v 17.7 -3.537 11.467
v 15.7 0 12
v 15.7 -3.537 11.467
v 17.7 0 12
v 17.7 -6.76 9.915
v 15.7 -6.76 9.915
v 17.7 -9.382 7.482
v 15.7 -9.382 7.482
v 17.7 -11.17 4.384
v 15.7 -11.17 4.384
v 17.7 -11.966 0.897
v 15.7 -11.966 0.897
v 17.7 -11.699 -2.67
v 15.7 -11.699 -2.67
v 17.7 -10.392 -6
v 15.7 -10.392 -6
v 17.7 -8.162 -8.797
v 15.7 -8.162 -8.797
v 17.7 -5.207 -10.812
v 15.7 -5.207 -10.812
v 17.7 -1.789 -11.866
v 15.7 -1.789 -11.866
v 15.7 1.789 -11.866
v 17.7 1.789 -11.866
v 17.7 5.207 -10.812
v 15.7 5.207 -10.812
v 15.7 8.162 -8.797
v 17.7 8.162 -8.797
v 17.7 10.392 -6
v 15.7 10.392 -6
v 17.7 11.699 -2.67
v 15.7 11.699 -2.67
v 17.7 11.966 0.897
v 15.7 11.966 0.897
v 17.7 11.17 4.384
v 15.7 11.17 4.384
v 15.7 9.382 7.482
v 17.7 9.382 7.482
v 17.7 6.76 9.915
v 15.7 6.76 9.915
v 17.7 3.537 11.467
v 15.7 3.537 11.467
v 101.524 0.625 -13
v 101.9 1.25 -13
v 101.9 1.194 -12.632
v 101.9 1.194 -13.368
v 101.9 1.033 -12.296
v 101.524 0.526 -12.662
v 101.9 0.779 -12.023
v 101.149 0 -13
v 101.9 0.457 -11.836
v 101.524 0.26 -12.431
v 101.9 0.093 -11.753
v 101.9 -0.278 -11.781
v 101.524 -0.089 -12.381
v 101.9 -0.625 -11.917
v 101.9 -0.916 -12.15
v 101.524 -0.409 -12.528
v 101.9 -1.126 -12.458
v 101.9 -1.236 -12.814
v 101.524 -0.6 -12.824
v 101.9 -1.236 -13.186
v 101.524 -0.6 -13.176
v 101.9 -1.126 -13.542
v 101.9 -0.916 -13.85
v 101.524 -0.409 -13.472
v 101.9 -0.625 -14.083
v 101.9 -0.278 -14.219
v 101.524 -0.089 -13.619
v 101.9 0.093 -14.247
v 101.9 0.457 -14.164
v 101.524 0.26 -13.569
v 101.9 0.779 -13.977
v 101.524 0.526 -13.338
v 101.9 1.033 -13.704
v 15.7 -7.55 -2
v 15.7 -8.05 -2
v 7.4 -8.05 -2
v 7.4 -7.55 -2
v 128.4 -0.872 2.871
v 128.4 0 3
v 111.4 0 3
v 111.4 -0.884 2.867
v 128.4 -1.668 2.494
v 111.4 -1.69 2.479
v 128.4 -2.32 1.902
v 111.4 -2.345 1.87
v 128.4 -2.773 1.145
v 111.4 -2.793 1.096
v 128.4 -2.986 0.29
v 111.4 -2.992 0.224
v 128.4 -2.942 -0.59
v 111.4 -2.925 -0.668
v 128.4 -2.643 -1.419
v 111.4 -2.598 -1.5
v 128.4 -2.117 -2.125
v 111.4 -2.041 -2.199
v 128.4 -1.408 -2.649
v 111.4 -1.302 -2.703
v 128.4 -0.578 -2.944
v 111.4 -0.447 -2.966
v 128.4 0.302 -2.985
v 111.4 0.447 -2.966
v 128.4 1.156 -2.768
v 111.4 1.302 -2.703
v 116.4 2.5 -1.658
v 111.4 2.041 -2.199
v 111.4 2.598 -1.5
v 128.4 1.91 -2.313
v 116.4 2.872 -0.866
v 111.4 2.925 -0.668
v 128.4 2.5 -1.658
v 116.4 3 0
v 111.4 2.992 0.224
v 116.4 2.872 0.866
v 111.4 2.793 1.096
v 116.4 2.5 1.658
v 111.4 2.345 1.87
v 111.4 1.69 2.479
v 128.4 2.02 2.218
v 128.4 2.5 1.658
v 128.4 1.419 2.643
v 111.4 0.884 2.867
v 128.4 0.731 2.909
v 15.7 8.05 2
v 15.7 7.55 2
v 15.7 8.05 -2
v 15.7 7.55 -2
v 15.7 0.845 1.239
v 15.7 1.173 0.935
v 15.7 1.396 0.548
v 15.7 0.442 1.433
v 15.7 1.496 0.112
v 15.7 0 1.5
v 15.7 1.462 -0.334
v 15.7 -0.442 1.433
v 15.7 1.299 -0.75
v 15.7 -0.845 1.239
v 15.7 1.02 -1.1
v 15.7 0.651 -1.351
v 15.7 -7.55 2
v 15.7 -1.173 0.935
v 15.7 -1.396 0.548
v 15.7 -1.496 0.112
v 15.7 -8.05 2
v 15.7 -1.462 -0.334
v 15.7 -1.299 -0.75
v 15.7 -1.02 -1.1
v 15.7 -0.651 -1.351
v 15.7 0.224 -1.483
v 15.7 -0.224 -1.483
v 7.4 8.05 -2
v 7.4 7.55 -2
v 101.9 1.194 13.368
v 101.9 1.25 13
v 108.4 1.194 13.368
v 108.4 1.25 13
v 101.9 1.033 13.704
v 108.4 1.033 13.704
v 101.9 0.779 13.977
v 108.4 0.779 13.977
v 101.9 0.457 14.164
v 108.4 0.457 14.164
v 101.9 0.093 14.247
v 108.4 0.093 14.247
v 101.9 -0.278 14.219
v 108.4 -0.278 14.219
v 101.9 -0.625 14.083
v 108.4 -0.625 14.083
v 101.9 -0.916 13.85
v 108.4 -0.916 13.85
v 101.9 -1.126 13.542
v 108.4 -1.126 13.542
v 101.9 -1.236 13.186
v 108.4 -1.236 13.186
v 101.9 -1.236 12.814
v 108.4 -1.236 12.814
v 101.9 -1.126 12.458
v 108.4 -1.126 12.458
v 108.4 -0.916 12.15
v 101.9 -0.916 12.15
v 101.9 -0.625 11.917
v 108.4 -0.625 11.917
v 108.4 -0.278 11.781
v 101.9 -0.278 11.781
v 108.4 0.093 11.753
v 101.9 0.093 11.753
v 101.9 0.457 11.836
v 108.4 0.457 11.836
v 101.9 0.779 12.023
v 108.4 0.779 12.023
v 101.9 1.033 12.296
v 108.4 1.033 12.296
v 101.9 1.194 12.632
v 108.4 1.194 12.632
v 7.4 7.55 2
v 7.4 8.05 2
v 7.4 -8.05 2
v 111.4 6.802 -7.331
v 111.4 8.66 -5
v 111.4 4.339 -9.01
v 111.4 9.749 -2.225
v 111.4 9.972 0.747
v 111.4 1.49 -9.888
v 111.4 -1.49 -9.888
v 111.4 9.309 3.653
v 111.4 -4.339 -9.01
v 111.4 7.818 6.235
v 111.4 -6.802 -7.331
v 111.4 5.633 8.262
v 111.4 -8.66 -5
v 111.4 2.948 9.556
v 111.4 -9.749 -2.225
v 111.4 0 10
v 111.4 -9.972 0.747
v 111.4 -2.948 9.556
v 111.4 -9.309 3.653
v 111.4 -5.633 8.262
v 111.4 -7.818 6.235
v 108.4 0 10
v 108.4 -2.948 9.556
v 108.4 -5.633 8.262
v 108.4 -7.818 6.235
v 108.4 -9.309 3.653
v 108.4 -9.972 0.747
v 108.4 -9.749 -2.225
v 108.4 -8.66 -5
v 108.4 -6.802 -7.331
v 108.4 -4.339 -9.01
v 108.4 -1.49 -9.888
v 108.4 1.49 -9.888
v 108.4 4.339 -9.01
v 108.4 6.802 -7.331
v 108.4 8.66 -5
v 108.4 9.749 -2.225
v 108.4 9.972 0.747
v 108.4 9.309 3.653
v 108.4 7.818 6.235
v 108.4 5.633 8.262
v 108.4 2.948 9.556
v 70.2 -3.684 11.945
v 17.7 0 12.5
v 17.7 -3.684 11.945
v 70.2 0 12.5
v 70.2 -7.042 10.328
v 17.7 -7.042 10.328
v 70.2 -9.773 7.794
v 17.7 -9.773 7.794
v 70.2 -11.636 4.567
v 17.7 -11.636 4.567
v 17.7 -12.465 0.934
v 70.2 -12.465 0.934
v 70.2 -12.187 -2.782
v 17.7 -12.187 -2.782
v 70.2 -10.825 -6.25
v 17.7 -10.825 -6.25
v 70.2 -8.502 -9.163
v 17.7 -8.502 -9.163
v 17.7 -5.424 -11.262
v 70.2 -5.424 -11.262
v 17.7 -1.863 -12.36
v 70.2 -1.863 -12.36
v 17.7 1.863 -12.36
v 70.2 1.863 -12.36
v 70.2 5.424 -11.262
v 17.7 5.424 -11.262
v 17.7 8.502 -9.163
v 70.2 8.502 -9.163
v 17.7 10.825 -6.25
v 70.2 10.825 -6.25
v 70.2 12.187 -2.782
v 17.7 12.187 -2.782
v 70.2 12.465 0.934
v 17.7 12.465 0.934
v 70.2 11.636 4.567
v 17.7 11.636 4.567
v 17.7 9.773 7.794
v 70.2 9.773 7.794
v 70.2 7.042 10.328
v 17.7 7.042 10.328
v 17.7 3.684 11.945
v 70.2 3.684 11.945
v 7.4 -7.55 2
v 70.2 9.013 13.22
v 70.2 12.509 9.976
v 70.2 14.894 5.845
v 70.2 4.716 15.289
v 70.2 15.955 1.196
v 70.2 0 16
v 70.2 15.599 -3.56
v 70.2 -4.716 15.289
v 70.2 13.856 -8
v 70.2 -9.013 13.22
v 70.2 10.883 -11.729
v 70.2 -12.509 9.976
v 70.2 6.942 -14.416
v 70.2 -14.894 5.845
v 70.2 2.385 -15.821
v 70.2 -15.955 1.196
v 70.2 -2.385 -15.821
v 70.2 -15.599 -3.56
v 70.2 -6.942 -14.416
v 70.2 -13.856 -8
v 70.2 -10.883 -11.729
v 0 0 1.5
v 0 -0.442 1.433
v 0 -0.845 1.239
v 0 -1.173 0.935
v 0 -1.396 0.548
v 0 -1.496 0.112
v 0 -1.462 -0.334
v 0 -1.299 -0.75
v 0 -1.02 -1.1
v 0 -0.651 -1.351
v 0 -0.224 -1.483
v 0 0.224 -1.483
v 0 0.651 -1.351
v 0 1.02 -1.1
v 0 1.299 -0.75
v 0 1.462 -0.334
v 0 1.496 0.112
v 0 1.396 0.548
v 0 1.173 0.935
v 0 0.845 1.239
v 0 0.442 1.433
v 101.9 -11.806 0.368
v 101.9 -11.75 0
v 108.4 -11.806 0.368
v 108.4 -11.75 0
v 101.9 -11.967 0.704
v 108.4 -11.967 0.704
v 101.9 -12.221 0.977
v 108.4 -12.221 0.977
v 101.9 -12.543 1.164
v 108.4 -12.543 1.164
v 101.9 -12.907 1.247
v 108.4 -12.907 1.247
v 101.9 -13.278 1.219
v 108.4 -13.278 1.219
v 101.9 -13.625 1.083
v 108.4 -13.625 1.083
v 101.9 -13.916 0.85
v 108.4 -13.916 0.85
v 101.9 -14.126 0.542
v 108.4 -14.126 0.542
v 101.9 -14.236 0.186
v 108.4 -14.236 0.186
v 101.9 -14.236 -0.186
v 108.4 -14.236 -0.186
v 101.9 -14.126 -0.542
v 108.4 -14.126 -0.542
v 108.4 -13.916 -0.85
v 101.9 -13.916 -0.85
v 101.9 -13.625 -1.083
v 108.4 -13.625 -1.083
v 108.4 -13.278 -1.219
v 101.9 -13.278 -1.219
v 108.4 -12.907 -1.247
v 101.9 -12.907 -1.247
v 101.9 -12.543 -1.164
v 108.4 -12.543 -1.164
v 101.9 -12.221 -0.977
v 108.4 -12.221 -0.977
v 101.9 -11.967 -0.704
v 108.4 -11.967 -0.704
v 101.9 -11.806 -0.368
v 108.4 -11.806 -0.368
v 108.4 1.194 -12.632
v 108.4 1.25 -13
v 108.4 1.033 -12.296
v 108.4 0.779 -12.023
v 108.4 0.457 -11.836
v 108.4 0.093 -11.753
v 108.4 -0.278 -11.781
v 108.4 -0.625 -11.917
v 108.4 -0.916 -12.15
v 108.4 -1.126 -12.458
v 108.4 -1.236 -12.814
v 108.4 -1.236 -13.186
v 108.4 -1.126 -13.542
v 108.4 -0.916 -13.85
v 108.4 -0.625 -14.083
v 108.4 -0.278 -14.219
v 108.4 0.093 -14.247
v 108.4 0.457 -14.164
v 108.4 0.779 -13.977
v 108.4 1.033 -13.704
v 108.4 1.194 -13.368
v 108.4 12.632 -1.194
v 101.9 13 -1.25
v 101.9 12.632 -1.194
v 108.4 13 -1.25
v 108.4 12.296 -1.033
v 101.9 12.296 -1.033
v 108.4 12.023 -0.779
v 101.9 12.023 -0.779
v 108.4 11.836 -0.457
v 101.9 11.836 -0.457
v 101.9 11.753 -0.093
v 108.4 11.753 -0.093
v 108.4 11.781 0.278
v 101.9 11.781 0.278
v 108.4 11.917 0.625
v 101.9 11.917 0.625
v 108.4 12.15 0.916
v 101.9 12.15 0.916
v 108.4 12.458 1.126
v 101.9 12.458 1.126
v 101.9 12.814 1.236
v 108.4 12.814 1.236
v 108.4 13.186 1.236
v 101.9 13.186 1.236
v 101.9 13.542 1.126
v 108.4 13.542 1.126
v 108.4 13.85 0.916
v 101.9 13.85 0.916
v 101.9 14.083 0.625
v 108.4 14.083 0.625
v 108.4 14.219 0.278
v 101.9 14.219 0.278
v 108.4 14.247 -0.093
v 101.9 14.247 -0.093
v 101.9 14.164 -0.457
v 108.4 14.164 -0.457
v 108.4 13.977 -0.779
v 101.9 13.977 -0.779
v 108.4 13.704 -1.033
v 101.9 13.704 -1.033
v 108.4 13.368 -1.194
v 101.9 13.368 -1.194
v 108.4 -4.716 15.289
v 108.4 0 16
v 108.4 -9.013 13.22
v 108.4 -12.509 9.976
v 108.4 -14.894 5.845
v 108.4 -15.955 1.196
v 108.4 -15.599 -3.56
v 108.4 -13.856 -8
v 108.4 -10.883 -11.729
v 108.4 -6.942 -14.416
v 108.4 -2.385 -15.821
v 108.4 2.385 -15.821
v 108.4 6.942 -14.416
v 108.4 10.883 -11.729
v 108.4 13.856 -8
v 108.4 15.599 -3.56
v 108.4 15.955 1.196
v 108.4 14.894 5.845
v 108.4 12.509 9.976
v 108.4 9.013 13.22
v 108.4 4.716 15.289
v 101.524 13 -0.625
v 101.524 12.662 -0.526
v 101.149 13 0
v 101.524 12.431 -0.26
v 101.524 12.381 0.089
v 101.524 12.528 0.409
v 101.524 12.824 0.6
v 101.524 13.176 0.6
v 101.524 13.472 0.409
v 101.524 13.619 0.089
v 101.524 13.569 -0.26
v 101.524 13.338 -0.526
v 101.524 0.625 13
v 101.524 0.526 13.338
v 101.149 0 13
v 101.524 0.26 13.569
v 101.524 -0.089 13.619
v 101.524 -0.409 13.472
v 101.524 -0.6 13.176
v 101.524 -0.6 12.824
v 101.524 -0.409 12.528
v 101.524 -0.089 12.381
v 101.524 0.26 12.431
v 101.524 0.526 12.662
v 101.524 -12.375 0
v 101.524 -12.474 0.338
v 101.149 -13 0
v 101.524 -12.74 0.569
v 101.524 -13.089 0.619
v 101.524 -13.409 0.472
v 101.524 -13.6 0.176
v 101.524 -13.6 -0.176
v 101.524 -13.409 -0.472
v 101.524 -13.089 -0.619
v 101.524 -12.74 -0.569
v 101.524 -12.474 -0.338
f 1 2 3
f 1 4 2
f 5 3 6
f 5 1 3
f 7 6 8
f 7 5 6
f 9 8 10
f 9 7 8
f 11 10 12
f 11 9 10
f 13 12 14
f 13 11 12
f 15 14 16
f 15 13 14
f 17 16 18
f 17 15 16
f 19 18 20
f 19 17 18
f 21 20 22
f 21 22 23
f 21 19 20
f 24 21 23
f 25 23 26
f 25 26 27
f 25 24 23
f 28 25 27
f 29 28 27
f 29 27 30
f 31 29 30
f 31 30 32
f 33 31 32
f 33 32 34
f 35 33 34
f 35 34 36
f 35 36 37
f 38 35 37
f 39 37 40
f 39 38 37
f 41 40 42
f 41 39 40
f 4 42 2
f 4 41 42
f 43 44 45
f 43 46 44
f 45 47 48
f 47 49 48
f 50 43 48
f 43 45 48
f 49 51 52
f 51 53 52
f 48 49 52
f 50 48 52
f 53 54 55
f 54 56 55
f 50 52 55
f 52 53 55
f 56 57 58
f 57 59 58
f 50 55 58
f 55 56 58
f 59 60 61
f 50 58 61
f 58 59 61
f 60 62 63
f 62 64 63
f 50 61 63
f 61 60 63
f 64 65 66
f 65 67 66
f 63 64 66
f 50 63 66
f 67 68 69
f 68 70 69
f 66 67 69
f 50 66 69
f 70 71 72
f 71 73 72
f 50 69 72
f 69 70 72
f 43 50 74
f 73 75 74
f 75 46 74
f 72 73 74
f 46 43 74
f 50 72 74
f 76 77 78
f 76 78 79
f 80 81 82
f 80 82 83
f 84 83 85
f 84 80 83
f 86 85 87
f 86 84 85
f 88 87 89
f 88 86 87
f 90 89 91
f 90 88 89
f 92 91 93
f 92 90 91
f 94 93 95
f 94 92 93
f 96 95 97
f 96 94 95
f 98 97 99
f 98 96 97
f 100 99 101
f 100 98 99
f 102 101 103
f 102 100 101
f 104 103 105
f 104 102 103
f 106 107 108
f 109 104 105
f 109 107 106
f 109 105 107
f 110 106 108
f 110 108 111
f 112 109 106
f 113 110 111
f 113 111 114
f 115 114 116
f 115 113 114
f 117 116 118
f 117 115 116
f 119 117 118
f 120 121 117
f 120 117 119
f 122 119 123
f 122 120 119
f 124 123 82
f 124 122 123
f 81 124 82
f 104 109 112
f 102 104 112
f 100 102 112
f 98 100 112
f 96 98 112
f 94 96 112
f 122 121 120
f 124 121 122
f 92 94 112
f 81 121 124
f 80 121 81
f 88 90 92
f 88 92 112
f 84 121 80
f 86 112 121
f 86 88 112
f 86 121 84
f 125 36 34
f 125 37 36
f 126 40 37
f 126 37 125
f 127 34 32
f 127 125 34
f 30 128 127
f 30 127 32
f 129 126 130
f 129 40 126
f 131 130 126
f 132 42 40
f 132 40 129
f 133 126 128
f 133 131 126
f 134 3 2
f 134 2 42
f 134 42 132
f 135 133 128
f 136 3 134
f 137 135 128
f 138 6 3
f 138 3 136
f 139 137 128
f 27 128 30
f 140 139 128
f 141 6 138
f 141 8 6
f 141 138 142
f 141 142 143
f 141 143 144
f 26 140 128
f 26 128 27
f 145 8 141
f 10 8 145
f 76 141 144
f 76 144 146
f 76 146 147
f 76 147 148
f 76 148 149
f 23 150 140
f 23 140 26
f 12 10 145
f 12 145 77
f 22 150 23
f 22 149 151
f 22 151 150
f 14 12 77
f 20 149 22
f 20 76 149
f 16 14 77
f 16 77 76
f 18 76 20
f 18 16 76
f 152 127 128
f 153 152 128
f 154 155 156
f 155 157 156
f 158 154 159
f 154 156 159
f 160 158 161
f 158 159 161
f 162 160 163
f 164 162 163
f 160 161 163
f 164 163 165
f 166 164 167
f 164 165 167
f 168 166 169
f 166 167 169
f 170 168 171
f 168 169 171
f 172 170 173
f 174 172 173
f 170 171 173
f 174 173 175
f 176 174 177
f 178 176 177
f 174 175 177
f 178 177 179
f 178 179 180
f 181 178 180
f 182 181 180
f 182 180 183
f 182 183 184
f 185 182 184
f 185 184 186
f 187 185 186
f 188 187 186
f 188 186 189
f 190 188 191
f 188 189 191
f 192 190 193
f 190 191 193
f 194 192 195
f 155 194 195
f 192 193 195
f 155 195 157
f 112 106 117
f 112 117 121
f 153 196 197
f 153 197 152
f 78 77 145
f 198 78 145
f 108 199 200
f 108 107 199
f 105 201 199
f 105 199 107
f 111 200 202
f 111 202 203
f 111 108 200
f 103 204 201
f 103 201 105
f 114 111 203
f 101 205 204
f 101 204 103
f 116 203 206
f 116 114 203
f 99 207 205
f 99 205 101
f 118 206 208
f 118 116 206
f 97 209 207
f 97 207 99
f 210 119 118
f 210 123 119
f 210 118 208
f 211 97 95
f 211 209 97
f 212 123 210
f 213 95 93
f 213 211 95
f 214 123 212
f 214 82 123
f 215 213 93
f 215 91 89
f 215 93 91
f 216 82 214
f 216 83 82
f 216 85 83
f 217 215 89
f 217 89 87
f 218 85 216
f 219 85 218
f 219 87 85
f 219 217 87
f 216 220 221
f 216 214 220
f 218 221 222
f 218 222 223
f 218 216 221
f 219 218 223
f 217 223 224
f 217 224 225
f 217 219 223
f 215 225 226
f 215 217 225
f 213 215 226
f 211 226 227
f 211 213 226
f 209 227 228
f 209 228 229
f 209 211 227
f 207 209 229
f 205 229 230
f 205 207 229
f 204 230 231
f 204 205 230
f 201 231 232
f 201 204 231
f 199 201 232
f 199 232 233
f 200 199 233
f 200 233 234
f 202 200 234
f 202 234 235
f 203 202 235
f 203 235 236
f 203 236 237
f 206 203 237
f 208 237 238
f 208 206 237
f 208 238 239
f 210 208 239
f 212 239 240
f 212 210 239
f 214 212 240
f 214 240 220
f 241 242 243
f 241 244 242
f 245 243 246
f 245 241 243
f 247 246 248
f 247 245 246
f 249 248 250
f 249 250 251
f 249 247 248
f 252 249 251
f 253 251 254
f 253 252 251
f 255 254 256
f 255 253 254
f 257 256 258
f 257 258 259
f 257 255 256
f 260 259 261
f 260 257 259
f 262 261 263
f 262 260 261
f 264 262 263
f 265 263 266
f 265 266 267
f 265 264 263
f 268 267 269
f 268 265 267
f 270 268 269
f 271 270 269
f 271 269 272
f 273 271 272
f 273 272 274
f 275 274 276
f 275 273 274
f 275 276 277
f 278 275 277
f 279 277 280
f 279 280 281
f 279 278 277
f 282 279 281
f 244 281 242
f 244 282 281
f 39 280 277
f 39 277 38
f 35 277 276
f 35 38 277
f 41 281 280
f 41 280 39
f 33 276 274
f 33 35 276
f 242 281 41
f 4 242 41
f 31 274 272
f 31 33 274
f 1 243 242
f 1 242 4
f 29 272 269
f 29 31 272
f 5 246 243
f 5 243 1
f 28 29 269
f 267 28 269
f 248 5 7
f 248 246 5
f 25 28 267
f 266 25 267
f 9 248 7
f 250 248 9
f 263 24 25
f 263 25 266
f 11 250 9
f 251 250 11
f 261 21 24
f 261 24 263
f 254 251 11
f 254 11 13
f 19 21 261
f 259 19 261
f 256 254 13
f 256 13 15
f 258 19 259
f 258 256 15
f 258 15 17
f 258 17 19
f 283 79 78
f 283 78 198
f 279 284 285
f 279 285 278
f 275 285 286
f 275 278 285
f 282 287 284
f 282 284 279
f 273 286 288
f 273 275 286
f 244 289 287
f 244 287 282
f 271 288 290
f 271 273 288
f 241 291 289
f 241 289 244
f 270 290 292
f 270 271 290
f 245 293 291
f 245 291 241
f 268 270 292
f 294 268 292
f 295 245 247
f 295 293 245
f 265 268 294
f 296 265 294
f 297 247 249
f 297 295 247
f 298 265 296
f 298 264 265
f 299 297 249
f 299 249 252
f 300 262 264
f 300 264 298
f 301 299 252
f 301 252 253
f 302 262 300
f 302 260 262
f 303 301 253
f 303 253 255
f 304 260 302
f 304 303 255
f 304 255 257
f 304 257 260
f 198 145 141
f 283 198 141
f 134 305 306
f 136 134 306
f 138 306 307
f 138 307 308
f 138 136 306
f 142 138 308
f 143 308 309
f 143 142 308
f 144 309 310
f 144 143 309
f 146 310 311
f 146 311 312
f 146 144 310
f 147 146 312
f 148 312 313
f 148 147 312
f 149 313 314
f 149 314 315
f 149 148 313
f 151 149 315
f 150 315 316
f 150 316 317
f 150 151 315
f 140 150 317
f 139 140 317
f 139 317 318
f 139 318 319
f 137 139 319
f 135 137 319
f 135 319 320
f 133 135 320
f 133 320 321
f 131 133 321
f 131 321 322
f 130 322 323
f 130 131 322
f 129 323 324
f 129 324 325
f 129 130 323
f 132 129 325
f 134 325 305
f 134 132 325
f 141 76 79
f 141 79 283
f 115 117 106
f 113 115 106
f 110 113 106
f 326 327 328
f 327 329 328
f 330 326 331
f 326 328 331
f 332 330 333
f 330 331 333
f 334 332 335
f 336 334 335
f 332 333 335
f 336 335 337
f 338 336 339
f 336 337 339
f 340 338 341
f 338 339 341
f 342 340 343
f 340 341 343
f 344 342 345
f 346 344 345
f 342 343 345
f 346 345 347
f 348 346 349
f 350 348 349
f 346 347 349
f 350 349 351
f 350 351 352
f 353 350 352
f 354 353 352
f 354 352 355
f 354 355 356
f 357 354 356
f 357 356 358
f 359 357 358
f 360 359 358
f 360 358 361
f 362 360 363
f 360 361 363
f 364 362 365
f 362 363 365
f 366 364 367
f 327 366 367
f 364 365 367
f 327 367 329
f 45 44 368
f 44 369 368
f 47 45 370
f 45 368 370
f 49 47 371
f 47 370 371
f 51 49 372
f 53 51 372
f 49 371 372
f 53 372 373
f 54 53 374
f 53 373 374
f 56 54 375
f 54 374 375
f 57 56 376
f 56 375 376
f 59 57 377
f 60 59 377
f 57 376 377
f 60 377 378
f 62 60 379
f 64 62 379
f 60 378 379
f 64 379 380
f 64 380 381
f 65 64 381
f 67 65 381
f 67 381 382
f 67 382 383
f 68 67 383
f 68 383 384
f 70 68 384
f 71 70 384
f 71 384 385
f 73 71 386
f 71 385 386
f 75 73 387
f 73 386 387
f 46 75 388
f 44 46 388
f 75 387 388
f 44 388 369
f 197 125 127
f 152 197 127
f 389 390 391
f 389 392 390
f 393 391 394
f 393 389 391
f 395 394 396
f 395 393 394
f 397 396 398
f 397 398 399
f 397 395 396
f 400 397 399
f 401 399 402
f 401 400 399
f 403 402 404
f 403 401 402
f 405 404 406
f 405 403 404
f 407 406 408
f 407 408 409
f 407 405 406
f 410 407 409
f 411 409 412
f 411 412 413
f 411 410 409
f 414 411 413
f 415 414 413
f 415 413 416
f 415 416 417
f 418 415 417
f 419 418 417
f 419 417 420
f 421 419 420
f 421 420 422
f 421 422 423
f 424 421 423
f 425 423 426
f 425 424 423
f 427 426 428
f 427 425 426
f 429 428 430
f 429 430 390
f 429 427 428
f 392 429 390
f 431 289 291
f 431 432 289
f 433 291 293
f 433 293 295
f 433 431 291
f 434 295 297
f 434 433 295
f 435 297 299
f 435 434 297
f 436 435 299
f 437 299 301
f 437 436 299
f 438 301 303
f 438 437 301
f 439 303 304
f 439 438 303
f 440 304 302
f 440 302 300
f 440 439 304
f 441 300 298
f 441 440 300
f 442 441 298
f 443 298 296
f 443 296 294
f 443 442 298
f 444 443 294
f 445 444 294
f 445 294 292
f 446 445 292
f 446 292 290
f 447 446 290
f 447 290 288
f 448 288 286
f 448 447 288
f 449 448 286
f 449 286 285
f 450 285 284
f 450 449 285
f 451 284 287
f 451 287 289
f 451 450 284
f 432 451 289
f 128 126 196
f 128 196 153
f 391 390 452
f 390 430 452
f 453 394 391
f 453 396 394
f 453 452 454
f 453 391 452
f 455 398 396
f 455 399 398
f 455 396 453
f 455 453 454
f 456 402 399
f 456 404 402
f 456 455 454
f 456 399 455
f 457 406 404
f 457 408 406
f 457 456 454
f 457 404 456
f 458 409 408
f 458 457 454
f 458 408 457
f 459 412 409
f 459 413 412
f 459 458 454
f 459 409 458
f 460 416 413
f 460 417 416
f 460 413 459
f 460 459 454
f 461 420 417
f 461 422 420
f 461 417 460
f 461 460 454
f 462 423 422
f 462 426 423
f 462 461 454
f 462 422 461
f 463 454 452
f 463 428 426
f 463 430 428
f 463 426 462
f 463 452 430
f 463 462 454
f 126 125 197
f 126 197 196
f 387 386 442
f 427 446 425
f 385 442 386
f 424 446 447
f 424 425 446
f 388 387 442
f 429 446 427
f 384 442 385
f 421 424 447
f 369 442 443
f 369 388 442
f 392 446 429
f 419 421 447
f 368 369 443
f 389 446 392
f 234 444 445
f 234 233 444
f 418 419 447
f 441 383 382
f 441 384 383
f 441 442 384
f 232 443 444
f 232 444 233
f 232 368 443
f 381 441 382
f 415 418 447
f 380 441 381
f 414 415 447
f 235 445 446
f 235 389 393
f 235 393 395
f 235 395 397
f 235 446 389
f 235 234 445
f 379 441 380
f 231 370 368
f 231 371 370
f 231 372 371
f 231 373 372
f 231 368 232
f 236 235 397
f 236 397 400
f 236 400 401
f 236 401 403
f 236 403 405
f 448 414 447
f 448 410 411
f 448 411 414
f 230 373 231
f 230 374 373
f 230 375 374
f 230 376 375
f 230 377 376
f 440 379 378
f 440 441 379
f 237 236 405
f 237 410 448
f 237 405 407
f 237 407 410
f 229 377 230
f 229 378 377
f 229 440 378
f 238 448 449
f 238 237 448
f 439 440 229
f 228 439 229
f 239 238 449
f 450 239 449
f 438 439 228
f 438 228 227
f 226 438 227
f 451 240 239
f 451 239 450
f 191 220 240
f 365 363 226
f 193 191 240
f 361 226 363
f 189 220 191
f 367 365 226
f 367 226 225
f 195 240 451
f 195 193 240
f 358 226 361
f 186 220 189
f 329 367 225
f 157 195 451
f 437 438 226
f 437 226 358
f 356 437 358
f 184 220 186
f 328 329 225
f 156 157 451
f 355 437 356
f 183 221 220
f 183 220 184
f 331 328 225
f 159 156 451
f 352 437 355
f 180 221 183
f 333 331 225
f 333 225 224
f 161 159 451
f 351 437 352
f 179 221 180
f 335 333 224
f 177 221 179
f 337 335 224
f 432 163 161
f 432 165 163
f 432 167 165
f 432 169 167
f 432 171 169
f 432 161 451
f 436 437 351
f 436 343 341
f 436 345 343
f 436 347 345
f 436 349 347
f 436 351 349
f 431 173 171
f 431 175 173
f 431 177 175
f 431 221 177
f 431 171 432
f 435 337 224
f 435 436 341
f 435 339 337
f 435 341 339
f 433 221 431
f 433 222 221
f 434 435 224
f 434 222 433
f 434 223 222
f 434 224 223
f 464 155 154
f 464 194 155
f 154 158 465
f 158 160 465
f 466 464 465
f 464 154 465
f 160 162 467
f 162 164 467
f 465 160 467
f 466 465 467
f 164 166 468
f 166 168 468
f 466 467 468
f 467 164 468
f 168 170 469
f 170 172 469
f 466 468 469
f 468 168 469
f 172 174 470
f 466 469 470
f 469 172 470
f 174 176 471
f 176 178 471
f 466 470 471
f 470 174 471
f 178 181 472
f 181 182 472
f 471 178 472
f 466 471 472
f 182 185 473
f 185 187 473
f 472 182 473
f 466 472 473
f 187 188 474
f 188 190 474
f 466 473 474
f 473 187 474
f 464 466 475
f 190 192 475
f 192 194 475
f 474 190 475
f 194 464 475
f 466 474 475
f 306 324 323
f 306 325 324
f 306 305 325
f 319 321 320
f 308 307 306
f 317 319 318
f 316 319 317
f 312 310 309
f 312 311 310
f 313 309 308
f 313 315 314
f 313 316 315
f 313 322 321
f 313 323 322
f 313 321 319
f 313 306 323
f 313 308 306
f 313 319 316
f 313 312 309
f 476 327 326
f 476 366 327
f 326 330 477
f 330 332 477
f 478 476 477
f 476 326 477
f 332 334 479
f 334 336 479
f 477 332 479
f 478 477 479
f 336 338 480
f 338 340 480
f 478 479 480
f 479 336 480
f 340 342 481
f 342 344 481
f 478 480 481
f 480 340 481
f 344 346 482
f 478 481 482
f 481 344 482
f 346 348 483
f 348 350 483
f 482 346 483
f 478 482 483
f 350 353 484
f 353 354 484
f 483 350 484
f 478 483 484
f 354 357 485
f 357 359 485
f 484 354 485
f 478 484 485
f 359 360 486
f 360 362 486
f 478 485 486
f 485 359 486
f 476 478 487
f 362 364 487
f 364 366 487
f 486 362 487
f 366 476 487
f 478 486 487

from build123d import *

# Parameters (mm, degrees)
ESQUISSE2_W                  = 4
ESQUISSE2_H                  = 0.5
EXTRUSION1_DEPTH             = 8.3
R_P_TITION_CIRCULAIRE1_COUNT = 2
ENL_V_MAT_EXTRU_1_DEPTH      = 131.378525839
ENL_V_MAT_EXTRU_1_DEPTH_BACK = 131.378525839
ESQUISSE3_W                  = 12
ESQUISSE3_H                  = 0.5


# Read off the part's stored shape, not the designer's step: Répétition circulaire2
with BuildPart() as part:
    # Esquisse1 → Révolution1 (revolve)
    with BuildSketch(Plane.XY, mode=Mode.PRIVATE) as r_volution1_sk:
        Polygon((0, 0), (0, 1.5), (15.7, 1.5), (15.7, 12), (17.7, 12), (17.7, 12.5), (70.2, 12.5), (70.2, 16), (108.4, 16), (108.4, 10), (111.4, 10), (111.4, 3), (128.4, 3), (128.4, 0), align=None)
    revolve(r_volution1_sk.sketch.rotate(Axis((-1000, 0, 0), (1, 0, 0)), 90), axis=Axis((-1000, 0, 0), (1, 0, 0)))

    # Esquisse2 → Extrusion1 (add)
    with BuildSketch(Plane.ZY.offset(-15.7)):
        with Locations((0, -7.8)):
            Rectangle(ESQUISSE2_W, ESQUISSE2_H)
    extrusion1 = extrude(amount=EXTRUSION1_DEPTH)

    # Répétition circulaire1: Extrusion1 ×2 about axis
    r_p_tition_circulaire1_axis = Axis((0, 0, 0), (1, 0, 0))
    for i in range(1, R_P_TITION_CIRCULAIRE1_COUNT):
        add(extrusion1.rotate(r_p_tition_circulaire1_axis, i * 360 / R_P_TITION_CIRCULAIRE1_COUNT))

    # Esquisse3 → Enlèv. mat.-Extru.1 (cut, two sides: drawn at the far end of the back side and taken through both)
    with BuildSketch(Plane.XY.offset(-ENL_V_MAT_EXTRU_1_DEPTH_BACK)):
        with Locations((122.4, 2.75)):
            Rectangle(ESQUISSE3_W, ESQUISSE3_H)
    extrude(amount=ENL_V_MAT_EXTRU_1_DEPTH + ENL_V_MAT_EXTRU_1_DEPTH_BACK, mode=Mode.SUBTRACT)

    # Esquisse5 → Trou taraudé M3x0.51 (revolve, cut)
    with BuildSketch(Plane(origin=(108.4, 13, 0), x_dir=(0, 0, -1), z_dir=(0, 1, 0))):
        Polygon((0, 0), (0, 7.251075774), (1.25, 6.5), (1.25, 0), align=None)
    revolve(axis=Axis((114.75, 13, 0), (-1, 0, 0)), mode=Mode.SUBTRACT)

    # Répétition circulaire2 outline → Répétition circulaire2 (revolve, cut)
    with BuildSketch(Plane.YX.offset(13)):
        Polygon((0, 101.148924226), (1.25, 101.9), (1.25, 108.4), (0, 108.4), align=None)
    revolve(axis=Axis((0, 0, -13), (1, 0, 0)), mode=Mode.SUBTRACT)

    # R_p_tition circulaire2 2 outline → R_p_tition circulaire2 2 (revolve, cut)
    with BuildSketch(Plane(origin=(0, -13, 0), x_dir=(0, 1, 0), z_dir=(0, 0, -1))):
        Polygon((0, 101.148924226), (1.25, 101.9), (1.25, 108.4), (0, 108.4), align=None)
    revolve(axis=Axis((0, -13, 0), (1, 0, 0)), mode=Mode.SUBTRACT)

    # R_p_tition circulaire2 3 outline → R_p_tition circulaire2 3 (revolve, cut)
    with BuildSketch(Plane.YX.offset(-13)):
        Polygon((0, 101.148924226), (1.25, 101.9), (1.25, 108.4), (0, 108.4), align=None)
    revolve(axis=Axis((0, 0, 13), (1, 0, 0)), mode=Mode.SUBTRACT)


solid = part.part
